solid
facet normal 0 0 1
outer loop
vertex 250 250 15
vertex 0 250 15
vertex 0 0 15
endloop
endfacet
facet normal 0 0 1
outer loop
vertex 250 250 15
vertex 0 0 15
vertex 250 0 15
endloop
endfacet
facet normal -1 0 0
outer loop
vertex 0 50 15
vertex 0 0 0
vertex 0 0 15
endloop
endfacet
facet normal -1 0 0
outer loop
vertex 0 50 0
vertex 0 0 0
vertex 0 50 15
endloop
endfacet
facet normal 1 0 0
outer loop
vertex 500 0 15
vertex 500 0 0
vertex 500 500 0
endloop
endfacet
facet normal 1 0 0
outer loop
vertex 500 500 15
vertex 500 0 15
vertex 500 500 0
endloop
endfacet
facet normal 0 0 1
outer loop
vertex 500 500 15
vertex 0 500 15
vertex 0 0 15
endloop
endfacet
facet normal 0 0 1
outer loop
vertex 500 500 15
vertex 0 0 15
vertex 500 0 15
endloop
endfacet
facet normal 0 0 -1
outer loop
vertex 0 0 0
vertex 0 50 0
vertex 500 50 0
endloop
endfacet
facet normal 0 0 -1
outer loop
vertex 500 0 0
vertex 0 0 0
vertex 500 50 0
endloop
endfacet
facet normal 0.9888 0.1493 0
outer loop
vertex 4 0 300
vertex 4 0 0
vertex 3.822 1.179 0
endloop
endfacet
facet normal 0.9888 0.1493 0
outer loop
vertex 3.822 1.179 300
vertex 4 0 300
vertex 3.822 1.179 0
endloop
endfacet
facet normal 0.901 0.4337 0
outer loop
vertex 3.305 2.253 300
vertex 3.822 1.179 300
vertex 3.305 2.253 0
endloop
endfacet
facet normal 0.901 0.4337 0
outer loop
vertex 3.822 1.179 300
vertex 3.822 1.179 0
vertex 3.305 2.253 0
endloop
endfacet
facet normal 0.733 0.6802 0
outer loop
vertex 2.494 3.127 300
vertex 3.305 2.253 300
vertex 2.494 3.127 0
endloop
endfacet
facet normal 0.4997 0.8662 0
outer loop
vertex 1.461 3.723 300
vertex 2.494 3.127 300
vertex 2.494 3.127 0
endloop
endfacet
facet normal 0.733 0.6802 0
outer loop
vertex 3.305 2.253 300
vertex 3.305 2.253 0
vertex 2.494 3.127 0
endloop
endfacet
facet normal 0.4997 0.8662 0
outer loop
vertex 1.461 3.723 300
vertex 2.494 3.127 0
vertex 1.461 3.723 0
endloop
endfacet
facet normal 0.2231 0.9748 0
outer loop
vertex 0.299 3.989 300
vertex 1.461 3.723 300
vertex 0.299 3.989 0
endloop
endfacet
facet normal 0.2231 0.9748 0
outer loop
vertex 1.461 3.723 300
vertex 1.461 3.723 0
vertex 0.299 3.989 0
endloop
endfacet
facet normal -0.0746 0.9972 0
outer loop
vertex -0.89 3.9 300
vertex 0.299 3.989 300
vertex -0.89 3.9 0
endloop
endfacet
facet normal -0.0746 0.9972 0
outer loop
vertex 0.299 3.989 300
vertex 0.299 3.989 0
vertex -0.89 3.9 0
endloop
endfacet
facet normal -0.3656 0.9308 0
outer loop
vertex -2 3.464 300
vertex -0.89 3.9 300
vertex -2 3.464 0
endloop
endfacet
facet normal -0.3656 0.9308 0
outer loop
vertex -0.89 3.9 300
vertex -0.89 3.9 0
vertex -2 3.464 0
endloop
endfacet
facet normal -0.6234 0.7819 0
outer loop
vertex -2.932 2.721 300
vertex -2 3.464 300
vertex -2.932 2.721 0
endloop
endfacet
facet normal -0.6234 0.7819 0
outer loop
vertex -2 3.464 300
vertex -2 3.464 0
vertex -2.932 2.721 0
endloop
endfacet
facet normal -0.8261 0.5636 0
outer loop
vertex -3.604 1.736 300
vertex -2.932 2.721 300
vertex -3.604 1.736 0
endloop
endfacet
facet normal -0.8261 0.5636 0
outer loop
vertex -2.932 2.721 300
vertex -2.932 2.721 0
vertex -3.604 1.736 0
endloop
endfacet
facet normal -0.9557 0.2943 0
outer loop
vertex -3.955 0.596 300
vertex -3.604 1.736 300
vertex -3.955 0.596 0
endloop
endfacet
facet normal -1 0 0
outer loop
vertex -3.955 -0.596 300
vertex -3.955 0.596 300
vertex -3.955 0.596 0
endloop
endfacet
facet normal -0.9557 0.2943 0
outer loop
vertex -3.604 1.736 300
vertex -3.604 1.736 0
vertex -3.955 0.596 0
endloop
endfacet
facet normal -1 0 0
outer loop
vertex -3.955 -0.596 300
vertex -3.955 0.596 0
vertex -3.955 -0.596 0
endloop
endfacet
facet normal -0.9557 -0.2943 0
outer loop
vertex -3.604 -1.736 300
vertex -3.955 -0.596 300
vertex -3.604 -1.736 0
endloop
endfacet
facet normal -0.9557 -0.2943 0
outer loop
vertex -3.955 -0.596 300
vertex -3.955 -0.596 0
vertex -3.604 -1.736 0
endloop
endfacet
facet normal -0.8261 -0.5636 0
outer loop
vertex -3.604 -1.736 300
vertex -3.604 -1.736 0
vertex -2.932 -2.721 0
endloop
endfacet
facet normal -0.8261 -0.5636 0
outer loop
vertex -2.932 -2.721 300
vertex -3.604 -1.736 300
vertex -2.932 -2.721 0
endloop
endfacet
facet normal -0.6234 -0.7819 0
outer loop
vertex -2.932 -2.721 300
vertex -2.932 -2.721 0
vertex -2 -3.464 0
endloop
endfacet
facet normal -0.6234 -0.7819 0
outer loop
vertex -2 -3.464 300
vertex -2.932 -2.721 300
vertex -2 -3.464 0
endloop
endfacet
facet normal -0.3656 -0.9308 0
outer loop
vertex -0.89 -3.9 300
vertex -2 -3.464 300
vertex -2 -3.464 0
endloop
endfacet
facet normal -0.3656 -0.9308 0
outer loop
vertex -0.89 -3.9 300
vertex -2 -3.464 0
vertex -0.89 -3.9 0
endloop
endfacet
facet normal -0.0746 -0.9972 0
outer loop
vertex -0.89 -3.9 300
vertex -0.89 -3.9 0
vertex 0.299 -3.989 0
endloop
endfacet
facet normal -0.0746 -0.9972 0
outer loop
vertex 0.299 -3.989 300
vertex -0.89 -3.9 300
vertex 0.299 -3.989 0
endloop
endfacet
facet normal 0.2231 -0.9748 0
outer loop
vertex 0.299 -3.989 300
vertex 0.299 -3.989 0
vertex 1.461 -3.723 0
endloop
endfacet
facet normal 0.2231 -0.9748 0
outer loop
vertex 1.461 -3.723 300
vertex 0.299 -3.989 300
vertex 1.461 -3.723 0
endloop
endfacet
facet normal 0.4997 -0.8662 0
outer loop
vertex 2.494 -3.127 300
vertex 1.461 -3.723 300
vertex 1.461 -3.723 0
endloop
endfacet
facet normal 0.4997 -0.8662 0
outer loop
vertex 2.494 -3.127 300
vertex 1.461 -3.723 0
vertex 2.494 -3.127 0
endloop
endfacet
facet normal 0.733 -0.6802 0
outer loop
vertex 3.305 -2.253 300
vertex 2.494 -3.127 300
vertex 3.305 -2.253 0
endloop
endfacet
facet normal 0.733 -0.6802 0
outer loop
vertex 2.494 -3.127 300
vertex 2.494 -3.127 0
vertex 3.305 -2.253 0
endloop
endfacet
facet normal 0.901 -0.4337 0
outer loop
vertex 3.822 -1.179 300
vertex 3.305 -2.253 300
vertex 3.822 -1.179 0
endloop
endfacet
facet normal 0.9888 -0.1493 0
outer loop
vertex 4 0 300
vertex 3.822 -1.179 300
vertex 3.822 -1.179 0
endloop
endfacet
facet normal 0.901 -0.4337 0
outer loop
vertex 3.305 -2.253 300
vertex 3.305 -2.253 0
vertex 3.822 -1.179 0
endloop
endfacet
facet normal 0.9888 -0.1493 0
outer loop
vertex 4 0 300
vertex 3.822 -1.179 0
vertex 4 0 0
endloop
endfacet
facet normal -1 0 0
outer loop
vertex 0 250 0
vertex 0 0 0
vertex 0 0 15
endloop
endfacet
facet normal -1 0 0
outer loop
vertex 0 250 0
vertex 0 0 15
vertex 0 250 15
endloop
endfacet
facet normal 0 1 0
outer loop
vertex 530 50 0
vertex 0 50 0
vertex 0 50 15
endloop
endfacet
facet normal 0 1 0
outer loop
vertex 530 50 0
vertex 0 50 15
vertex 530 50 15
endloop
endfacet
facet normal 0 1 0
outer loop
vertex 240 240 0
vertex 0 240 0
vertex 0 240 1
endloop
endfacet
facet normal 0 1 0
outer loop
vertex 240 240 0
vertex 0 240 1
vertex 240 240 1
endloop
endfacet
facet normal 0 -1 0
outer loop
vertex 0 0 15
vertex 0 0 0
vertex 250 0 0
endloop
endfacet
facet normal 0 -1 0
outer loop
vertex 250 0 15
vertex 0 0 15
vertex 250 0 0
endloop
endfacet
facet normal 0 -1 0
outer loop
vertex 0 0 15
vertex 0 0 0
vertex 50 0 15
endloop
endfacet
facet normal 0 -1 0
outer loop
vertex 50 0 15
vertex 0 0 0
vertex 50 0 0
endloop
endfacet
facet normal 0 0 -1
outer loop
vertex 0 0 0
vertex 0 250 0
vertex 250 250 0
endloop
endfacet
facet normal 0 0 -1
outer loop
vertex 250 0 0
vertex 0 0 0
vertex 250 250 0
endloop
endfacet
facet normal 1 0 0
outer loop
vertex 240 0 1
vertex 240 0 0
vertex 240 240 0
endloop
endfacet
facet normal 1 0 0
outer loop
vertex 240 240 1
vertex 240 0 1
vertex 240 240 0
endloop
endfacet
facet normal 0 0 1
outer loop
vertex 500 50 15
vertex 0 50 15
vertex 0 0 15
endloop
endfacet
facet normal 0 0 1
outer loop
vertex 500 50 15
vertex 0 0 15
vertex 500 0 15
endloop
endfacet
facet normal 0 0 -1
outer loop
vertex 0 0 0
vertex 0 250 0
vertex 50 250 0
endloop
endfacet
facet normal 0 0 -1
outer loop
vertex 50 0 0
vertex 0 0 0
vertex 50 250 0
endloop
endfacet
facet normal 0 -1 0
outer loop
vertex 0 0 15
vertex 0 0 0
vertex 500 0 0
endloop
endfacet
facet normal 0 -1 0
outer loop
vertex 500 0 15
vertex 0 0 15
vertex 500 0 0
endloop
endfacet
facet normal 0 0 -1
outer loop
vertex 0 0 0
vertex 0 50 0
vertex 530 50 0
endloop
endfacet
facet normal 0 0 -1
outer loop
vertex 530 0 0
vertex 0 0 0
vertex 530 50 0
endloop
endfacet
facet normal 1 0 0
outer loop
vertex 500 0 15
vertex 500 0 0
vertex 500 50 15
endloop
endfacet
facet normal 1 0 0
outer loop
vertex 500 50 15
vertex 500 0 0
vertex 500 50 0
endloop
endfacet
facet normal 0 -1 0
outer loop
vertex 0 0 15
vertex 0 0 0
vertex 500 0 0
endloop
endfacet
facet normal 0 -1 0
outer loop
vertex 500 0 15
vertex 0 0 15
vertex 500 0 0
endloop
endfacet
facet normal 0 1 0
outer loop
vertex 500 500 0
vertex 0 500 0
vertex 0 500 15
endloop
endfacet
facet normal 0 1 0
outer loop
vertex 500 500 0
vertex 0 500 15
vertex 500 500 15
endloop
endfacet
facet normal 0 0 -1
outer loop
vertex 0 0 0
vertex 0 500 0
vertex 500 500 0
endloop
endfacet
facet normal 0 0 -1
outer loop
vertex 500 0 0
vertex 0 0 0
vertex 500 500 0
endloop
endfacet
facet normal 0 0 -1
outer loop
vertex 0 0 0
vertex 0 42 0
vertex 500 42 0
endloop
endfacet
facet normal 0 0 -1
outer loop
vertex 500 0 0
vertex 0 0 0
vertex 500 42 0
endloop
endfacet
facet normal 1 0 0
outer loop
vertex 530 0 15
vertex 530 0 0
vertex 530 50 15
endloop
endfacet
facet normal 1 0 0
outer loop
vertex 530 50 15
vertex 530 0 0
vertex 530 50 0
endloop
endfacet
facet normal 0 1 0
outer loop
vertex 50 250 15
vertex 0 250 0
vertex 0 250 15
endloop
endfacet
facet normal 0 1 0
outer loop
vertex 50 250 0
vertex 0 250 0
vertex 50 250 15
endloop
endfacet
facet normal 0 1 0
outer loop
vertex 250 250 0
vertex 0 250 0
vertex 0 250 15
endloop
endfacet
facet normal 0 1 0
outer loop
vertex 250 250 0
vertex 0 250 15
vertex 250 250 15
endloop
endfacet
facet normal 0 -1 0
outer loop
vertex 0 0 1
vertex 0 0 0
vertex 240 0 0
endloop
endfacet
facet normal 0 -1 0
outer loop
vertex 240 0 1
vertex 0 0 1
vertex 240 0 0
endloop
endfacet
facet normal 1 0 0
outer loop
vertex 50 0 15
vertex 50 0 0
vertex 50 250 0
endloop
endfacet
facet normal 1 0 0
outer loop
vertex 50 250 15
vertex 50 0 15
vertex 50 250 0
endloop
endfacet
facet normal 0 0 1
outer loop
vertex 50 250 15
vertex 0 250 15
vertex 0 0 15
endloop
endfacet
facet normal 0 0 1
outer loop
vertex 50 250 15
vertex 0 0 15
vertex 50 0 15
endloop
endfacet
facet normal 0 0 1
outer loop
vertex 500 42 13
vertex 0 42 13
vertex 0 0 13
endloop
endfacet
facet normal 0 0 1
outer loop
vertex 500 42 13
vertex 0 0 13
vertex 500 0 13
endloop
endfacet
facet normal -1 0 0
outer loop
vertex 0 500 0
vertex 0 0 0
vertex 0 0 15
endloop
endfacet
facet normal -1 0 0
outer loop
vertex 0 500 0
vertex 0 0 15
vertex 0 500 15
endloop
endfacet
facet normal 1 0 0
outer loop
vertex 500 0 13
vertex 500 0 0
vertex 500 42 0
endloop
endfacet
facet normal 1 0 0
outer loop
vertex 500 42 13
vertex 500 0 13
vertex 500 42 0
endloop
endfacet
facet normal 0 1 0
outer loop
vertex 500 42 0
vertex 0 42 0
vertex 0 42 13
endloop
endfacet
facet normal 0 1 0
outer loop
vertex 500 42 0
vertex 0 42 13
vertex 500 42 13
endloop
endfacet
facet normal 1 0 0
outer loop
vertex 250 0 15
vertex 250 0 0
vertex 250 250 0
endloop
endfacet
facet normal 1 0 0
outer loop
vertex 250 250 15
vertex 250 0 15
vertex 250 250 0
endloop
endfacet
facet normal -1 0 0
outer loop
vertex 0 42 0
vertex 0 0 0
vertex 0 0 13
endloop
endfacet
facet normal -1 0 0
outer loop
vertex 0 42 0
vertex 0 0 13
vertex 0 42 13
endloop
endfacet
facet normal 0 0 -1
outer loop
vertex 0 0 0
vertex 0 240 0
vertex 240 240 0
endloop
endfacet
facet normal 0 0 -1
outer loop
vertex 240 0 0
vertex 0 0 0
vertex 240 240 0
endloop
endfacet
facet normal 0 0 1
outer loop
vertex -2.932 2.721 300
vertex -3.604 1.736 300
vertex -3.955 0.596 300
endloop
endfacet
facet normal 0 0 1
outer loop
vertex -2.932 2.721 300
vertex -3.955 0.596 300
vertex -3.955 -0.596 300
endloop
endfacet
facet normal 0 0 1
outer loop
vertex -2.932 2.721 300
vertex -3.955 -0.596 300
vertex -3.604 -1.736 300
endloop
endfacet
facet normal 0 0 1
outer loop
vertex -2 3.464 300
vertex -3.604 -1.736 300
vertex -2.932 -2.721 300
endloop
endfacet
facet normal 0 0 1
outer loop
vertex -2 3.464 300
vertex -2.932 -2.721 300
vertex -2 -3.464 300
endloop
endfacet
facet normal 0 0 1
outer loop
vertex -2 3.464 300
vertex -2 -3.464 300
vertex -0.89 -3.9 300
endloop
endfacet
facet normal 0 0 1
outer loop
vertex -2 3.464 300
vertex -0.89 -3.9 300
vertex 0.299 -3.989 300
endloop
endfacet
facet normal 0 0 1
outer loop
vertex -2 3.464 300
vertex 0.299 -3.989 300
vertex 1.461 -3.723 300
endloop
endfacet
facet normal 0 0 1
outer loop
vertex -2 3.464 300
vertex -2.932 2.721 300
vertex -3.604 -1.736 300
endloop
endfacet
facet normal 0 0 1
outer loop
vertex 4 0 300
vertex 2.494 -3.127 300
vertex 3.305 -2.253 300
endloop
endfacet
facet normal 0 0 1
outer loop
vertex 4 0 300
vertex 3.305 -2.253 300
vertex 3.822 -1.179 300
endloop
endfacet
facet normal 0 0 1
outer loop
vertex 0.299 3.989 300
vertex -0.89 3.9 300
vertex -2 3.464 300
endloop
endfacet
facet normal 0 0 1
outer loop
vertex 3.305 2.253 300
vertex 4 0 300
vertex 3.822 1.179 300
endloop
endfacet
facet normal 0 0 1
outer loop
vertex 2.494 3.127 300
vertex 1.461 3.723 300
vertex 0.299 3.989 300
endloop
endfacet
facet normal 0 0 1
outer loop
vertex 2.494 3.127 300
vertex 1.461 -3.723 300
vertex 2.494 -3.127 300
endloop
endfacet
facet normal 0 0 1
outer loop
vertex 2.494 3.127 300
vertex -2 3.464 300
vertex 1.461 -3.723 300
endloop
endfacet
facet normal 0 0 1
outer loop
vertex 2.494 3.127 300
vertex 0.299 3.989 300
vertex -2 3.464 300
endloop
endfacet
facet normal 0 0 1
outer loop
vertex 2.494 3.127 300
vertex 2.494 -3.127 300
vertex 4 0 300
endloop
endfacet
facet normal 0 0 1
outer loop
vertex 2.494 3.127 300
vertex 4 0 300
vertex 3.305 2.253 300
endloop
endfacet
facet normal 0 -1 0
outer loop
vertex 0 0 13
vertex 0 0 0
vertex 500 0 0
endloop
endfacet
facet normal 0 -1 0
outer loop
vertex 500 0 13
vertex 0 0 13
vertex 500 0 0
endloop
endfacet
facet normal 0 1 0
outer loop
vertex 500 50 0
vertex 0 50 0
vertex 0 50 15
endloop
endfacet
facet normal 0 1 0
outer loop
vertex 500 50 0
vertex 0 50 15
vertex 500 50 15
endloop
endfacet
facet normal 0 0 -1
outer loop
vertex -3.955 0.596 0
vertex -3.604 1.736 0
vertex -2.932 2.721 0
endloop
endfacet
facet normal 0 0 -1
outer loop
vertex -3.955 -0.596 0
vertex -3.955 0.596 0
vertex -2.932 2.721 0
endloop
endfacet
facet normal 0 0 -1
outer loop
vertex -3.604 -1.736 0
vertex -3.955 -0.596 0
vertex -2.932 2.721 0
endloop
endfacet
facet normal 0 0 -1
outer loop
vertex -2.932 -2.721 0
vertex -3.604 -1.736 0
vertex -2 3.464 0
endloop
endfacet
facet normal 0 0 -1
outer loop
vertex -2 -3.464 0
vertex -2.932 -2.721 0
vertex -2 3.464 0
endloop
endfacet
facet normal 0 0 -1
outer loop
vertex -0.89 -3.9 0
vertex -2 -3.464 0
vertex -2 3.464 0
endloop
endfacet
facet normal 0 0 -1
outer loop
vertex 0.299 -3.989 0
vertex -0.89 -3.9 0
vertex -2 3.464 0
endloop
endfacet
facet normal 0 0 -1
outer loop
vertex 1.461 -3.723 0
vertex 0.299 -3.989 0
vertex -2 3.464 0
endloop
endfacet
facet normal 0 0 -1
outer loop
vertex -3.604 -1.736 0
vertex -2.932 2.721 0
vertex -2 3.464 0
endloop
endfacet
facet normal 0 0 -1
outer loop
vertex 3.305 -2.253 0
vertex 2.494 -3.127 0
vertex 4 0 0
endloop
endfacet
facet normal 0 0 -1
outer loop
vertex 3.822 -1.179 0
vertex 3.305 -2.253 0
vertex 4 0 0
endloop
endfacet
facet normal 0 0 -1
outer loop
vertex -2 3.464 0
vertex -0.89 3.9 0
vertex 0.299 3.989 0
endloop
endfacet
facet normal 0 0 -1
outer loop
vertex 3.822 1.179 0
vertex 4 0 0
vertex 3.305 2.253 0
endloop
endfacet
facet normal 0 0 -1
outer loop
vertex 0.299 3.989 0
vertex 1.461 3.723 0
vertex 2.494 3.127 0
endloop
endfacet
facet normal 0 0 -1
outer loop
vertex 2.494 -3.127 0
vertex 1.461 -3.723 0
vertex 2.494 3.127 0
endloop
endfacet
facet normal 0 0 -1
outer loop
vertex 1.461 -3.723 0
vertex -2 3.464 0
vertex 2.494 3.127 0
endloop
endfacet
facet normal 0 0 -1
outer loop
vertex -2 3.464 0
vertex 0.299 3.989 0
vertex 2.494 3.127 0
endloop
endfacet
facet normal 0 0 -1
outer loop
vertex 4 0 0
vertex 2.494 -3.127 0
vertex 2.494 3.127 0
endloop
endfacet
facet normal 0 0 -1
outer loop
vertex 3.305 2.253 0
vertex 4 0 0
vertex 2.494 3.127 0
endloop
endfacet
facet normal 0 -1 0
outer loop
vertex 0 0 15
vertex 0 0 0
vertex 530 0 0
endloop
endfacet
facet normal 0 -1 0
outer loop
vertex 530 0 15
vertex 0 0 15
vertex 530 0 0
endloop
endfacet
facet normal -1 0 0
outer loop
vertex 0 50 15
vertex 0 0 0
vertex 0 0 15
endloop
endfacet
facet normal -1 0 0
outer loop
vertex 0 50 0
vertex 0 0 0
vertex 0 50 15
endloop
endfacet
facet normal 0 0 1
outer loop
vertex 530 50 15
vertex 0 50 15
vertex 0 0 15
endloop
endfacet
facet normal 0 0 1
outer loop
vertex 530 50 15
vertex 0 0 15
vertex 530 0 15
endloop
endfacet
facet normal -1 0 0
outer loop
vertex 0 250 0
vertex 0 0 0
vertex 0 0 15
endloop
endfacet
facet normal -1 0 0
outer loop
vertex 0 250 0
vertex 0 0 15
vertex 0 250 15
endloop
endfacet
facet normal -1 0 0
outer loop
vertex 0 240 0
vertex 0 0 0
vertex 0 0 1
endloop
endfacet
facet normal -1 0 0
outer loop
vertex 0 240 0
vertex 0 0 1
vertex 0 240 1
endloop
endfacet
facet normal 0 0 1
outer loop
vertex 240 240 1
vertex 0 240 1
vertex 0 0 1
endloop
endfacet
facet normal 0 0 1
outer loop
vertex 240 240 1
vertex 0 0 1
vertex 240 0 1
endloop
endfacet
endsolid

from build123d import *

# Parameters (mm, degrees)
F0_R      = 4
F1_DEPTH  = 300
F2_W      = 500
F2_H      = 42
F3_DEPTH  = 13
F4_W      = 500
F4_H      = 500
F5_DEPTH  = 15
F6_W      = 240
F6_H      = 240
F7_DEPTH  = 1
F8_W      = 50
F8_H      = 250
F9_DEPTH  = 15
F10_W     = 530
F10_H     = 50
F11_DEPTH = 15
F12_W     = 250
F12_H     = 250
F13_DEPTH = 15
F14_W     = 500
F14_H     = 50
F15_DEPTH = 15


# Not quite as in the source:
# - a feature names something its author has since deleted; it is built from what else it names


with BuildPart() as f1:
    # F0 (on Top) → F1 (new body)
    with BuildSketch(Plane.XY):
        Circle(F0_R)
    extrude(amount=F1_DEPTH)


with BuildPart() as f3:
    # F2 (on Top) → F3 (new body)
    with BuildSketch(Plane.XY):
        with Locations((250, 21)):
            Rectangle(F2_W, F2_H)
    extrude(amount=F3_DEPTH)


with BuildPart() as f5:
    # F4 (on Top) → F5 (new body)
    with BuildSketch(Plane.XY):
        with Locations((250, 250)):
            Rectangle(F4_W, F4_H)
    extrude(amount=F5_DEPTH)


with BuildPart() as f7:
    # F6 (on Top) → F7 (new body)
    with BuildSketch(Plane.XY):
        with Locations((120, 120)):
            Rectangle(F6_W, F6_H)
    extrude(amount=F7_DEPTH)


with BuildPart() as f9:
    # F8 (on Top) → F9 (new body)
    with BuildSketch(Plane.XY):
        with Locations((25, 125)):
            Rectangle(F8_W, F8_H)
    extrude(amount=F9_DEPTH)


with BuildPart() as f11:
    # F10 (on Top) → F11 (new body)
    with BuildSketch(Plane.XY):
        with Locations((265, 25)):
            Rectangle(F10_W, F10_H)
    extrude(amount=F11_DEPTH)


with BuildPart() as f13:
    # F12 (on Top) → F13 (new body)
    with BuildSketch(Plane.XY):
        with Locations((125, 125)):
            Rectangle(F12_W, F12_H)
    extrude(amount=F13_DEPTH)


with BuildPart() as f15:
    # F14 (on Top) → F15 (new body)
    with BuildSketch(Plane.XY):
        with Locations((250, 25)):
            Rectangle(F14_W, F14_H)
    extrude(amount=F15_DEPTH)


solid = Compound([f1.part, f3.part, f5.part, f7.part, f9.part, f11.part, f13.part, f15.part])
